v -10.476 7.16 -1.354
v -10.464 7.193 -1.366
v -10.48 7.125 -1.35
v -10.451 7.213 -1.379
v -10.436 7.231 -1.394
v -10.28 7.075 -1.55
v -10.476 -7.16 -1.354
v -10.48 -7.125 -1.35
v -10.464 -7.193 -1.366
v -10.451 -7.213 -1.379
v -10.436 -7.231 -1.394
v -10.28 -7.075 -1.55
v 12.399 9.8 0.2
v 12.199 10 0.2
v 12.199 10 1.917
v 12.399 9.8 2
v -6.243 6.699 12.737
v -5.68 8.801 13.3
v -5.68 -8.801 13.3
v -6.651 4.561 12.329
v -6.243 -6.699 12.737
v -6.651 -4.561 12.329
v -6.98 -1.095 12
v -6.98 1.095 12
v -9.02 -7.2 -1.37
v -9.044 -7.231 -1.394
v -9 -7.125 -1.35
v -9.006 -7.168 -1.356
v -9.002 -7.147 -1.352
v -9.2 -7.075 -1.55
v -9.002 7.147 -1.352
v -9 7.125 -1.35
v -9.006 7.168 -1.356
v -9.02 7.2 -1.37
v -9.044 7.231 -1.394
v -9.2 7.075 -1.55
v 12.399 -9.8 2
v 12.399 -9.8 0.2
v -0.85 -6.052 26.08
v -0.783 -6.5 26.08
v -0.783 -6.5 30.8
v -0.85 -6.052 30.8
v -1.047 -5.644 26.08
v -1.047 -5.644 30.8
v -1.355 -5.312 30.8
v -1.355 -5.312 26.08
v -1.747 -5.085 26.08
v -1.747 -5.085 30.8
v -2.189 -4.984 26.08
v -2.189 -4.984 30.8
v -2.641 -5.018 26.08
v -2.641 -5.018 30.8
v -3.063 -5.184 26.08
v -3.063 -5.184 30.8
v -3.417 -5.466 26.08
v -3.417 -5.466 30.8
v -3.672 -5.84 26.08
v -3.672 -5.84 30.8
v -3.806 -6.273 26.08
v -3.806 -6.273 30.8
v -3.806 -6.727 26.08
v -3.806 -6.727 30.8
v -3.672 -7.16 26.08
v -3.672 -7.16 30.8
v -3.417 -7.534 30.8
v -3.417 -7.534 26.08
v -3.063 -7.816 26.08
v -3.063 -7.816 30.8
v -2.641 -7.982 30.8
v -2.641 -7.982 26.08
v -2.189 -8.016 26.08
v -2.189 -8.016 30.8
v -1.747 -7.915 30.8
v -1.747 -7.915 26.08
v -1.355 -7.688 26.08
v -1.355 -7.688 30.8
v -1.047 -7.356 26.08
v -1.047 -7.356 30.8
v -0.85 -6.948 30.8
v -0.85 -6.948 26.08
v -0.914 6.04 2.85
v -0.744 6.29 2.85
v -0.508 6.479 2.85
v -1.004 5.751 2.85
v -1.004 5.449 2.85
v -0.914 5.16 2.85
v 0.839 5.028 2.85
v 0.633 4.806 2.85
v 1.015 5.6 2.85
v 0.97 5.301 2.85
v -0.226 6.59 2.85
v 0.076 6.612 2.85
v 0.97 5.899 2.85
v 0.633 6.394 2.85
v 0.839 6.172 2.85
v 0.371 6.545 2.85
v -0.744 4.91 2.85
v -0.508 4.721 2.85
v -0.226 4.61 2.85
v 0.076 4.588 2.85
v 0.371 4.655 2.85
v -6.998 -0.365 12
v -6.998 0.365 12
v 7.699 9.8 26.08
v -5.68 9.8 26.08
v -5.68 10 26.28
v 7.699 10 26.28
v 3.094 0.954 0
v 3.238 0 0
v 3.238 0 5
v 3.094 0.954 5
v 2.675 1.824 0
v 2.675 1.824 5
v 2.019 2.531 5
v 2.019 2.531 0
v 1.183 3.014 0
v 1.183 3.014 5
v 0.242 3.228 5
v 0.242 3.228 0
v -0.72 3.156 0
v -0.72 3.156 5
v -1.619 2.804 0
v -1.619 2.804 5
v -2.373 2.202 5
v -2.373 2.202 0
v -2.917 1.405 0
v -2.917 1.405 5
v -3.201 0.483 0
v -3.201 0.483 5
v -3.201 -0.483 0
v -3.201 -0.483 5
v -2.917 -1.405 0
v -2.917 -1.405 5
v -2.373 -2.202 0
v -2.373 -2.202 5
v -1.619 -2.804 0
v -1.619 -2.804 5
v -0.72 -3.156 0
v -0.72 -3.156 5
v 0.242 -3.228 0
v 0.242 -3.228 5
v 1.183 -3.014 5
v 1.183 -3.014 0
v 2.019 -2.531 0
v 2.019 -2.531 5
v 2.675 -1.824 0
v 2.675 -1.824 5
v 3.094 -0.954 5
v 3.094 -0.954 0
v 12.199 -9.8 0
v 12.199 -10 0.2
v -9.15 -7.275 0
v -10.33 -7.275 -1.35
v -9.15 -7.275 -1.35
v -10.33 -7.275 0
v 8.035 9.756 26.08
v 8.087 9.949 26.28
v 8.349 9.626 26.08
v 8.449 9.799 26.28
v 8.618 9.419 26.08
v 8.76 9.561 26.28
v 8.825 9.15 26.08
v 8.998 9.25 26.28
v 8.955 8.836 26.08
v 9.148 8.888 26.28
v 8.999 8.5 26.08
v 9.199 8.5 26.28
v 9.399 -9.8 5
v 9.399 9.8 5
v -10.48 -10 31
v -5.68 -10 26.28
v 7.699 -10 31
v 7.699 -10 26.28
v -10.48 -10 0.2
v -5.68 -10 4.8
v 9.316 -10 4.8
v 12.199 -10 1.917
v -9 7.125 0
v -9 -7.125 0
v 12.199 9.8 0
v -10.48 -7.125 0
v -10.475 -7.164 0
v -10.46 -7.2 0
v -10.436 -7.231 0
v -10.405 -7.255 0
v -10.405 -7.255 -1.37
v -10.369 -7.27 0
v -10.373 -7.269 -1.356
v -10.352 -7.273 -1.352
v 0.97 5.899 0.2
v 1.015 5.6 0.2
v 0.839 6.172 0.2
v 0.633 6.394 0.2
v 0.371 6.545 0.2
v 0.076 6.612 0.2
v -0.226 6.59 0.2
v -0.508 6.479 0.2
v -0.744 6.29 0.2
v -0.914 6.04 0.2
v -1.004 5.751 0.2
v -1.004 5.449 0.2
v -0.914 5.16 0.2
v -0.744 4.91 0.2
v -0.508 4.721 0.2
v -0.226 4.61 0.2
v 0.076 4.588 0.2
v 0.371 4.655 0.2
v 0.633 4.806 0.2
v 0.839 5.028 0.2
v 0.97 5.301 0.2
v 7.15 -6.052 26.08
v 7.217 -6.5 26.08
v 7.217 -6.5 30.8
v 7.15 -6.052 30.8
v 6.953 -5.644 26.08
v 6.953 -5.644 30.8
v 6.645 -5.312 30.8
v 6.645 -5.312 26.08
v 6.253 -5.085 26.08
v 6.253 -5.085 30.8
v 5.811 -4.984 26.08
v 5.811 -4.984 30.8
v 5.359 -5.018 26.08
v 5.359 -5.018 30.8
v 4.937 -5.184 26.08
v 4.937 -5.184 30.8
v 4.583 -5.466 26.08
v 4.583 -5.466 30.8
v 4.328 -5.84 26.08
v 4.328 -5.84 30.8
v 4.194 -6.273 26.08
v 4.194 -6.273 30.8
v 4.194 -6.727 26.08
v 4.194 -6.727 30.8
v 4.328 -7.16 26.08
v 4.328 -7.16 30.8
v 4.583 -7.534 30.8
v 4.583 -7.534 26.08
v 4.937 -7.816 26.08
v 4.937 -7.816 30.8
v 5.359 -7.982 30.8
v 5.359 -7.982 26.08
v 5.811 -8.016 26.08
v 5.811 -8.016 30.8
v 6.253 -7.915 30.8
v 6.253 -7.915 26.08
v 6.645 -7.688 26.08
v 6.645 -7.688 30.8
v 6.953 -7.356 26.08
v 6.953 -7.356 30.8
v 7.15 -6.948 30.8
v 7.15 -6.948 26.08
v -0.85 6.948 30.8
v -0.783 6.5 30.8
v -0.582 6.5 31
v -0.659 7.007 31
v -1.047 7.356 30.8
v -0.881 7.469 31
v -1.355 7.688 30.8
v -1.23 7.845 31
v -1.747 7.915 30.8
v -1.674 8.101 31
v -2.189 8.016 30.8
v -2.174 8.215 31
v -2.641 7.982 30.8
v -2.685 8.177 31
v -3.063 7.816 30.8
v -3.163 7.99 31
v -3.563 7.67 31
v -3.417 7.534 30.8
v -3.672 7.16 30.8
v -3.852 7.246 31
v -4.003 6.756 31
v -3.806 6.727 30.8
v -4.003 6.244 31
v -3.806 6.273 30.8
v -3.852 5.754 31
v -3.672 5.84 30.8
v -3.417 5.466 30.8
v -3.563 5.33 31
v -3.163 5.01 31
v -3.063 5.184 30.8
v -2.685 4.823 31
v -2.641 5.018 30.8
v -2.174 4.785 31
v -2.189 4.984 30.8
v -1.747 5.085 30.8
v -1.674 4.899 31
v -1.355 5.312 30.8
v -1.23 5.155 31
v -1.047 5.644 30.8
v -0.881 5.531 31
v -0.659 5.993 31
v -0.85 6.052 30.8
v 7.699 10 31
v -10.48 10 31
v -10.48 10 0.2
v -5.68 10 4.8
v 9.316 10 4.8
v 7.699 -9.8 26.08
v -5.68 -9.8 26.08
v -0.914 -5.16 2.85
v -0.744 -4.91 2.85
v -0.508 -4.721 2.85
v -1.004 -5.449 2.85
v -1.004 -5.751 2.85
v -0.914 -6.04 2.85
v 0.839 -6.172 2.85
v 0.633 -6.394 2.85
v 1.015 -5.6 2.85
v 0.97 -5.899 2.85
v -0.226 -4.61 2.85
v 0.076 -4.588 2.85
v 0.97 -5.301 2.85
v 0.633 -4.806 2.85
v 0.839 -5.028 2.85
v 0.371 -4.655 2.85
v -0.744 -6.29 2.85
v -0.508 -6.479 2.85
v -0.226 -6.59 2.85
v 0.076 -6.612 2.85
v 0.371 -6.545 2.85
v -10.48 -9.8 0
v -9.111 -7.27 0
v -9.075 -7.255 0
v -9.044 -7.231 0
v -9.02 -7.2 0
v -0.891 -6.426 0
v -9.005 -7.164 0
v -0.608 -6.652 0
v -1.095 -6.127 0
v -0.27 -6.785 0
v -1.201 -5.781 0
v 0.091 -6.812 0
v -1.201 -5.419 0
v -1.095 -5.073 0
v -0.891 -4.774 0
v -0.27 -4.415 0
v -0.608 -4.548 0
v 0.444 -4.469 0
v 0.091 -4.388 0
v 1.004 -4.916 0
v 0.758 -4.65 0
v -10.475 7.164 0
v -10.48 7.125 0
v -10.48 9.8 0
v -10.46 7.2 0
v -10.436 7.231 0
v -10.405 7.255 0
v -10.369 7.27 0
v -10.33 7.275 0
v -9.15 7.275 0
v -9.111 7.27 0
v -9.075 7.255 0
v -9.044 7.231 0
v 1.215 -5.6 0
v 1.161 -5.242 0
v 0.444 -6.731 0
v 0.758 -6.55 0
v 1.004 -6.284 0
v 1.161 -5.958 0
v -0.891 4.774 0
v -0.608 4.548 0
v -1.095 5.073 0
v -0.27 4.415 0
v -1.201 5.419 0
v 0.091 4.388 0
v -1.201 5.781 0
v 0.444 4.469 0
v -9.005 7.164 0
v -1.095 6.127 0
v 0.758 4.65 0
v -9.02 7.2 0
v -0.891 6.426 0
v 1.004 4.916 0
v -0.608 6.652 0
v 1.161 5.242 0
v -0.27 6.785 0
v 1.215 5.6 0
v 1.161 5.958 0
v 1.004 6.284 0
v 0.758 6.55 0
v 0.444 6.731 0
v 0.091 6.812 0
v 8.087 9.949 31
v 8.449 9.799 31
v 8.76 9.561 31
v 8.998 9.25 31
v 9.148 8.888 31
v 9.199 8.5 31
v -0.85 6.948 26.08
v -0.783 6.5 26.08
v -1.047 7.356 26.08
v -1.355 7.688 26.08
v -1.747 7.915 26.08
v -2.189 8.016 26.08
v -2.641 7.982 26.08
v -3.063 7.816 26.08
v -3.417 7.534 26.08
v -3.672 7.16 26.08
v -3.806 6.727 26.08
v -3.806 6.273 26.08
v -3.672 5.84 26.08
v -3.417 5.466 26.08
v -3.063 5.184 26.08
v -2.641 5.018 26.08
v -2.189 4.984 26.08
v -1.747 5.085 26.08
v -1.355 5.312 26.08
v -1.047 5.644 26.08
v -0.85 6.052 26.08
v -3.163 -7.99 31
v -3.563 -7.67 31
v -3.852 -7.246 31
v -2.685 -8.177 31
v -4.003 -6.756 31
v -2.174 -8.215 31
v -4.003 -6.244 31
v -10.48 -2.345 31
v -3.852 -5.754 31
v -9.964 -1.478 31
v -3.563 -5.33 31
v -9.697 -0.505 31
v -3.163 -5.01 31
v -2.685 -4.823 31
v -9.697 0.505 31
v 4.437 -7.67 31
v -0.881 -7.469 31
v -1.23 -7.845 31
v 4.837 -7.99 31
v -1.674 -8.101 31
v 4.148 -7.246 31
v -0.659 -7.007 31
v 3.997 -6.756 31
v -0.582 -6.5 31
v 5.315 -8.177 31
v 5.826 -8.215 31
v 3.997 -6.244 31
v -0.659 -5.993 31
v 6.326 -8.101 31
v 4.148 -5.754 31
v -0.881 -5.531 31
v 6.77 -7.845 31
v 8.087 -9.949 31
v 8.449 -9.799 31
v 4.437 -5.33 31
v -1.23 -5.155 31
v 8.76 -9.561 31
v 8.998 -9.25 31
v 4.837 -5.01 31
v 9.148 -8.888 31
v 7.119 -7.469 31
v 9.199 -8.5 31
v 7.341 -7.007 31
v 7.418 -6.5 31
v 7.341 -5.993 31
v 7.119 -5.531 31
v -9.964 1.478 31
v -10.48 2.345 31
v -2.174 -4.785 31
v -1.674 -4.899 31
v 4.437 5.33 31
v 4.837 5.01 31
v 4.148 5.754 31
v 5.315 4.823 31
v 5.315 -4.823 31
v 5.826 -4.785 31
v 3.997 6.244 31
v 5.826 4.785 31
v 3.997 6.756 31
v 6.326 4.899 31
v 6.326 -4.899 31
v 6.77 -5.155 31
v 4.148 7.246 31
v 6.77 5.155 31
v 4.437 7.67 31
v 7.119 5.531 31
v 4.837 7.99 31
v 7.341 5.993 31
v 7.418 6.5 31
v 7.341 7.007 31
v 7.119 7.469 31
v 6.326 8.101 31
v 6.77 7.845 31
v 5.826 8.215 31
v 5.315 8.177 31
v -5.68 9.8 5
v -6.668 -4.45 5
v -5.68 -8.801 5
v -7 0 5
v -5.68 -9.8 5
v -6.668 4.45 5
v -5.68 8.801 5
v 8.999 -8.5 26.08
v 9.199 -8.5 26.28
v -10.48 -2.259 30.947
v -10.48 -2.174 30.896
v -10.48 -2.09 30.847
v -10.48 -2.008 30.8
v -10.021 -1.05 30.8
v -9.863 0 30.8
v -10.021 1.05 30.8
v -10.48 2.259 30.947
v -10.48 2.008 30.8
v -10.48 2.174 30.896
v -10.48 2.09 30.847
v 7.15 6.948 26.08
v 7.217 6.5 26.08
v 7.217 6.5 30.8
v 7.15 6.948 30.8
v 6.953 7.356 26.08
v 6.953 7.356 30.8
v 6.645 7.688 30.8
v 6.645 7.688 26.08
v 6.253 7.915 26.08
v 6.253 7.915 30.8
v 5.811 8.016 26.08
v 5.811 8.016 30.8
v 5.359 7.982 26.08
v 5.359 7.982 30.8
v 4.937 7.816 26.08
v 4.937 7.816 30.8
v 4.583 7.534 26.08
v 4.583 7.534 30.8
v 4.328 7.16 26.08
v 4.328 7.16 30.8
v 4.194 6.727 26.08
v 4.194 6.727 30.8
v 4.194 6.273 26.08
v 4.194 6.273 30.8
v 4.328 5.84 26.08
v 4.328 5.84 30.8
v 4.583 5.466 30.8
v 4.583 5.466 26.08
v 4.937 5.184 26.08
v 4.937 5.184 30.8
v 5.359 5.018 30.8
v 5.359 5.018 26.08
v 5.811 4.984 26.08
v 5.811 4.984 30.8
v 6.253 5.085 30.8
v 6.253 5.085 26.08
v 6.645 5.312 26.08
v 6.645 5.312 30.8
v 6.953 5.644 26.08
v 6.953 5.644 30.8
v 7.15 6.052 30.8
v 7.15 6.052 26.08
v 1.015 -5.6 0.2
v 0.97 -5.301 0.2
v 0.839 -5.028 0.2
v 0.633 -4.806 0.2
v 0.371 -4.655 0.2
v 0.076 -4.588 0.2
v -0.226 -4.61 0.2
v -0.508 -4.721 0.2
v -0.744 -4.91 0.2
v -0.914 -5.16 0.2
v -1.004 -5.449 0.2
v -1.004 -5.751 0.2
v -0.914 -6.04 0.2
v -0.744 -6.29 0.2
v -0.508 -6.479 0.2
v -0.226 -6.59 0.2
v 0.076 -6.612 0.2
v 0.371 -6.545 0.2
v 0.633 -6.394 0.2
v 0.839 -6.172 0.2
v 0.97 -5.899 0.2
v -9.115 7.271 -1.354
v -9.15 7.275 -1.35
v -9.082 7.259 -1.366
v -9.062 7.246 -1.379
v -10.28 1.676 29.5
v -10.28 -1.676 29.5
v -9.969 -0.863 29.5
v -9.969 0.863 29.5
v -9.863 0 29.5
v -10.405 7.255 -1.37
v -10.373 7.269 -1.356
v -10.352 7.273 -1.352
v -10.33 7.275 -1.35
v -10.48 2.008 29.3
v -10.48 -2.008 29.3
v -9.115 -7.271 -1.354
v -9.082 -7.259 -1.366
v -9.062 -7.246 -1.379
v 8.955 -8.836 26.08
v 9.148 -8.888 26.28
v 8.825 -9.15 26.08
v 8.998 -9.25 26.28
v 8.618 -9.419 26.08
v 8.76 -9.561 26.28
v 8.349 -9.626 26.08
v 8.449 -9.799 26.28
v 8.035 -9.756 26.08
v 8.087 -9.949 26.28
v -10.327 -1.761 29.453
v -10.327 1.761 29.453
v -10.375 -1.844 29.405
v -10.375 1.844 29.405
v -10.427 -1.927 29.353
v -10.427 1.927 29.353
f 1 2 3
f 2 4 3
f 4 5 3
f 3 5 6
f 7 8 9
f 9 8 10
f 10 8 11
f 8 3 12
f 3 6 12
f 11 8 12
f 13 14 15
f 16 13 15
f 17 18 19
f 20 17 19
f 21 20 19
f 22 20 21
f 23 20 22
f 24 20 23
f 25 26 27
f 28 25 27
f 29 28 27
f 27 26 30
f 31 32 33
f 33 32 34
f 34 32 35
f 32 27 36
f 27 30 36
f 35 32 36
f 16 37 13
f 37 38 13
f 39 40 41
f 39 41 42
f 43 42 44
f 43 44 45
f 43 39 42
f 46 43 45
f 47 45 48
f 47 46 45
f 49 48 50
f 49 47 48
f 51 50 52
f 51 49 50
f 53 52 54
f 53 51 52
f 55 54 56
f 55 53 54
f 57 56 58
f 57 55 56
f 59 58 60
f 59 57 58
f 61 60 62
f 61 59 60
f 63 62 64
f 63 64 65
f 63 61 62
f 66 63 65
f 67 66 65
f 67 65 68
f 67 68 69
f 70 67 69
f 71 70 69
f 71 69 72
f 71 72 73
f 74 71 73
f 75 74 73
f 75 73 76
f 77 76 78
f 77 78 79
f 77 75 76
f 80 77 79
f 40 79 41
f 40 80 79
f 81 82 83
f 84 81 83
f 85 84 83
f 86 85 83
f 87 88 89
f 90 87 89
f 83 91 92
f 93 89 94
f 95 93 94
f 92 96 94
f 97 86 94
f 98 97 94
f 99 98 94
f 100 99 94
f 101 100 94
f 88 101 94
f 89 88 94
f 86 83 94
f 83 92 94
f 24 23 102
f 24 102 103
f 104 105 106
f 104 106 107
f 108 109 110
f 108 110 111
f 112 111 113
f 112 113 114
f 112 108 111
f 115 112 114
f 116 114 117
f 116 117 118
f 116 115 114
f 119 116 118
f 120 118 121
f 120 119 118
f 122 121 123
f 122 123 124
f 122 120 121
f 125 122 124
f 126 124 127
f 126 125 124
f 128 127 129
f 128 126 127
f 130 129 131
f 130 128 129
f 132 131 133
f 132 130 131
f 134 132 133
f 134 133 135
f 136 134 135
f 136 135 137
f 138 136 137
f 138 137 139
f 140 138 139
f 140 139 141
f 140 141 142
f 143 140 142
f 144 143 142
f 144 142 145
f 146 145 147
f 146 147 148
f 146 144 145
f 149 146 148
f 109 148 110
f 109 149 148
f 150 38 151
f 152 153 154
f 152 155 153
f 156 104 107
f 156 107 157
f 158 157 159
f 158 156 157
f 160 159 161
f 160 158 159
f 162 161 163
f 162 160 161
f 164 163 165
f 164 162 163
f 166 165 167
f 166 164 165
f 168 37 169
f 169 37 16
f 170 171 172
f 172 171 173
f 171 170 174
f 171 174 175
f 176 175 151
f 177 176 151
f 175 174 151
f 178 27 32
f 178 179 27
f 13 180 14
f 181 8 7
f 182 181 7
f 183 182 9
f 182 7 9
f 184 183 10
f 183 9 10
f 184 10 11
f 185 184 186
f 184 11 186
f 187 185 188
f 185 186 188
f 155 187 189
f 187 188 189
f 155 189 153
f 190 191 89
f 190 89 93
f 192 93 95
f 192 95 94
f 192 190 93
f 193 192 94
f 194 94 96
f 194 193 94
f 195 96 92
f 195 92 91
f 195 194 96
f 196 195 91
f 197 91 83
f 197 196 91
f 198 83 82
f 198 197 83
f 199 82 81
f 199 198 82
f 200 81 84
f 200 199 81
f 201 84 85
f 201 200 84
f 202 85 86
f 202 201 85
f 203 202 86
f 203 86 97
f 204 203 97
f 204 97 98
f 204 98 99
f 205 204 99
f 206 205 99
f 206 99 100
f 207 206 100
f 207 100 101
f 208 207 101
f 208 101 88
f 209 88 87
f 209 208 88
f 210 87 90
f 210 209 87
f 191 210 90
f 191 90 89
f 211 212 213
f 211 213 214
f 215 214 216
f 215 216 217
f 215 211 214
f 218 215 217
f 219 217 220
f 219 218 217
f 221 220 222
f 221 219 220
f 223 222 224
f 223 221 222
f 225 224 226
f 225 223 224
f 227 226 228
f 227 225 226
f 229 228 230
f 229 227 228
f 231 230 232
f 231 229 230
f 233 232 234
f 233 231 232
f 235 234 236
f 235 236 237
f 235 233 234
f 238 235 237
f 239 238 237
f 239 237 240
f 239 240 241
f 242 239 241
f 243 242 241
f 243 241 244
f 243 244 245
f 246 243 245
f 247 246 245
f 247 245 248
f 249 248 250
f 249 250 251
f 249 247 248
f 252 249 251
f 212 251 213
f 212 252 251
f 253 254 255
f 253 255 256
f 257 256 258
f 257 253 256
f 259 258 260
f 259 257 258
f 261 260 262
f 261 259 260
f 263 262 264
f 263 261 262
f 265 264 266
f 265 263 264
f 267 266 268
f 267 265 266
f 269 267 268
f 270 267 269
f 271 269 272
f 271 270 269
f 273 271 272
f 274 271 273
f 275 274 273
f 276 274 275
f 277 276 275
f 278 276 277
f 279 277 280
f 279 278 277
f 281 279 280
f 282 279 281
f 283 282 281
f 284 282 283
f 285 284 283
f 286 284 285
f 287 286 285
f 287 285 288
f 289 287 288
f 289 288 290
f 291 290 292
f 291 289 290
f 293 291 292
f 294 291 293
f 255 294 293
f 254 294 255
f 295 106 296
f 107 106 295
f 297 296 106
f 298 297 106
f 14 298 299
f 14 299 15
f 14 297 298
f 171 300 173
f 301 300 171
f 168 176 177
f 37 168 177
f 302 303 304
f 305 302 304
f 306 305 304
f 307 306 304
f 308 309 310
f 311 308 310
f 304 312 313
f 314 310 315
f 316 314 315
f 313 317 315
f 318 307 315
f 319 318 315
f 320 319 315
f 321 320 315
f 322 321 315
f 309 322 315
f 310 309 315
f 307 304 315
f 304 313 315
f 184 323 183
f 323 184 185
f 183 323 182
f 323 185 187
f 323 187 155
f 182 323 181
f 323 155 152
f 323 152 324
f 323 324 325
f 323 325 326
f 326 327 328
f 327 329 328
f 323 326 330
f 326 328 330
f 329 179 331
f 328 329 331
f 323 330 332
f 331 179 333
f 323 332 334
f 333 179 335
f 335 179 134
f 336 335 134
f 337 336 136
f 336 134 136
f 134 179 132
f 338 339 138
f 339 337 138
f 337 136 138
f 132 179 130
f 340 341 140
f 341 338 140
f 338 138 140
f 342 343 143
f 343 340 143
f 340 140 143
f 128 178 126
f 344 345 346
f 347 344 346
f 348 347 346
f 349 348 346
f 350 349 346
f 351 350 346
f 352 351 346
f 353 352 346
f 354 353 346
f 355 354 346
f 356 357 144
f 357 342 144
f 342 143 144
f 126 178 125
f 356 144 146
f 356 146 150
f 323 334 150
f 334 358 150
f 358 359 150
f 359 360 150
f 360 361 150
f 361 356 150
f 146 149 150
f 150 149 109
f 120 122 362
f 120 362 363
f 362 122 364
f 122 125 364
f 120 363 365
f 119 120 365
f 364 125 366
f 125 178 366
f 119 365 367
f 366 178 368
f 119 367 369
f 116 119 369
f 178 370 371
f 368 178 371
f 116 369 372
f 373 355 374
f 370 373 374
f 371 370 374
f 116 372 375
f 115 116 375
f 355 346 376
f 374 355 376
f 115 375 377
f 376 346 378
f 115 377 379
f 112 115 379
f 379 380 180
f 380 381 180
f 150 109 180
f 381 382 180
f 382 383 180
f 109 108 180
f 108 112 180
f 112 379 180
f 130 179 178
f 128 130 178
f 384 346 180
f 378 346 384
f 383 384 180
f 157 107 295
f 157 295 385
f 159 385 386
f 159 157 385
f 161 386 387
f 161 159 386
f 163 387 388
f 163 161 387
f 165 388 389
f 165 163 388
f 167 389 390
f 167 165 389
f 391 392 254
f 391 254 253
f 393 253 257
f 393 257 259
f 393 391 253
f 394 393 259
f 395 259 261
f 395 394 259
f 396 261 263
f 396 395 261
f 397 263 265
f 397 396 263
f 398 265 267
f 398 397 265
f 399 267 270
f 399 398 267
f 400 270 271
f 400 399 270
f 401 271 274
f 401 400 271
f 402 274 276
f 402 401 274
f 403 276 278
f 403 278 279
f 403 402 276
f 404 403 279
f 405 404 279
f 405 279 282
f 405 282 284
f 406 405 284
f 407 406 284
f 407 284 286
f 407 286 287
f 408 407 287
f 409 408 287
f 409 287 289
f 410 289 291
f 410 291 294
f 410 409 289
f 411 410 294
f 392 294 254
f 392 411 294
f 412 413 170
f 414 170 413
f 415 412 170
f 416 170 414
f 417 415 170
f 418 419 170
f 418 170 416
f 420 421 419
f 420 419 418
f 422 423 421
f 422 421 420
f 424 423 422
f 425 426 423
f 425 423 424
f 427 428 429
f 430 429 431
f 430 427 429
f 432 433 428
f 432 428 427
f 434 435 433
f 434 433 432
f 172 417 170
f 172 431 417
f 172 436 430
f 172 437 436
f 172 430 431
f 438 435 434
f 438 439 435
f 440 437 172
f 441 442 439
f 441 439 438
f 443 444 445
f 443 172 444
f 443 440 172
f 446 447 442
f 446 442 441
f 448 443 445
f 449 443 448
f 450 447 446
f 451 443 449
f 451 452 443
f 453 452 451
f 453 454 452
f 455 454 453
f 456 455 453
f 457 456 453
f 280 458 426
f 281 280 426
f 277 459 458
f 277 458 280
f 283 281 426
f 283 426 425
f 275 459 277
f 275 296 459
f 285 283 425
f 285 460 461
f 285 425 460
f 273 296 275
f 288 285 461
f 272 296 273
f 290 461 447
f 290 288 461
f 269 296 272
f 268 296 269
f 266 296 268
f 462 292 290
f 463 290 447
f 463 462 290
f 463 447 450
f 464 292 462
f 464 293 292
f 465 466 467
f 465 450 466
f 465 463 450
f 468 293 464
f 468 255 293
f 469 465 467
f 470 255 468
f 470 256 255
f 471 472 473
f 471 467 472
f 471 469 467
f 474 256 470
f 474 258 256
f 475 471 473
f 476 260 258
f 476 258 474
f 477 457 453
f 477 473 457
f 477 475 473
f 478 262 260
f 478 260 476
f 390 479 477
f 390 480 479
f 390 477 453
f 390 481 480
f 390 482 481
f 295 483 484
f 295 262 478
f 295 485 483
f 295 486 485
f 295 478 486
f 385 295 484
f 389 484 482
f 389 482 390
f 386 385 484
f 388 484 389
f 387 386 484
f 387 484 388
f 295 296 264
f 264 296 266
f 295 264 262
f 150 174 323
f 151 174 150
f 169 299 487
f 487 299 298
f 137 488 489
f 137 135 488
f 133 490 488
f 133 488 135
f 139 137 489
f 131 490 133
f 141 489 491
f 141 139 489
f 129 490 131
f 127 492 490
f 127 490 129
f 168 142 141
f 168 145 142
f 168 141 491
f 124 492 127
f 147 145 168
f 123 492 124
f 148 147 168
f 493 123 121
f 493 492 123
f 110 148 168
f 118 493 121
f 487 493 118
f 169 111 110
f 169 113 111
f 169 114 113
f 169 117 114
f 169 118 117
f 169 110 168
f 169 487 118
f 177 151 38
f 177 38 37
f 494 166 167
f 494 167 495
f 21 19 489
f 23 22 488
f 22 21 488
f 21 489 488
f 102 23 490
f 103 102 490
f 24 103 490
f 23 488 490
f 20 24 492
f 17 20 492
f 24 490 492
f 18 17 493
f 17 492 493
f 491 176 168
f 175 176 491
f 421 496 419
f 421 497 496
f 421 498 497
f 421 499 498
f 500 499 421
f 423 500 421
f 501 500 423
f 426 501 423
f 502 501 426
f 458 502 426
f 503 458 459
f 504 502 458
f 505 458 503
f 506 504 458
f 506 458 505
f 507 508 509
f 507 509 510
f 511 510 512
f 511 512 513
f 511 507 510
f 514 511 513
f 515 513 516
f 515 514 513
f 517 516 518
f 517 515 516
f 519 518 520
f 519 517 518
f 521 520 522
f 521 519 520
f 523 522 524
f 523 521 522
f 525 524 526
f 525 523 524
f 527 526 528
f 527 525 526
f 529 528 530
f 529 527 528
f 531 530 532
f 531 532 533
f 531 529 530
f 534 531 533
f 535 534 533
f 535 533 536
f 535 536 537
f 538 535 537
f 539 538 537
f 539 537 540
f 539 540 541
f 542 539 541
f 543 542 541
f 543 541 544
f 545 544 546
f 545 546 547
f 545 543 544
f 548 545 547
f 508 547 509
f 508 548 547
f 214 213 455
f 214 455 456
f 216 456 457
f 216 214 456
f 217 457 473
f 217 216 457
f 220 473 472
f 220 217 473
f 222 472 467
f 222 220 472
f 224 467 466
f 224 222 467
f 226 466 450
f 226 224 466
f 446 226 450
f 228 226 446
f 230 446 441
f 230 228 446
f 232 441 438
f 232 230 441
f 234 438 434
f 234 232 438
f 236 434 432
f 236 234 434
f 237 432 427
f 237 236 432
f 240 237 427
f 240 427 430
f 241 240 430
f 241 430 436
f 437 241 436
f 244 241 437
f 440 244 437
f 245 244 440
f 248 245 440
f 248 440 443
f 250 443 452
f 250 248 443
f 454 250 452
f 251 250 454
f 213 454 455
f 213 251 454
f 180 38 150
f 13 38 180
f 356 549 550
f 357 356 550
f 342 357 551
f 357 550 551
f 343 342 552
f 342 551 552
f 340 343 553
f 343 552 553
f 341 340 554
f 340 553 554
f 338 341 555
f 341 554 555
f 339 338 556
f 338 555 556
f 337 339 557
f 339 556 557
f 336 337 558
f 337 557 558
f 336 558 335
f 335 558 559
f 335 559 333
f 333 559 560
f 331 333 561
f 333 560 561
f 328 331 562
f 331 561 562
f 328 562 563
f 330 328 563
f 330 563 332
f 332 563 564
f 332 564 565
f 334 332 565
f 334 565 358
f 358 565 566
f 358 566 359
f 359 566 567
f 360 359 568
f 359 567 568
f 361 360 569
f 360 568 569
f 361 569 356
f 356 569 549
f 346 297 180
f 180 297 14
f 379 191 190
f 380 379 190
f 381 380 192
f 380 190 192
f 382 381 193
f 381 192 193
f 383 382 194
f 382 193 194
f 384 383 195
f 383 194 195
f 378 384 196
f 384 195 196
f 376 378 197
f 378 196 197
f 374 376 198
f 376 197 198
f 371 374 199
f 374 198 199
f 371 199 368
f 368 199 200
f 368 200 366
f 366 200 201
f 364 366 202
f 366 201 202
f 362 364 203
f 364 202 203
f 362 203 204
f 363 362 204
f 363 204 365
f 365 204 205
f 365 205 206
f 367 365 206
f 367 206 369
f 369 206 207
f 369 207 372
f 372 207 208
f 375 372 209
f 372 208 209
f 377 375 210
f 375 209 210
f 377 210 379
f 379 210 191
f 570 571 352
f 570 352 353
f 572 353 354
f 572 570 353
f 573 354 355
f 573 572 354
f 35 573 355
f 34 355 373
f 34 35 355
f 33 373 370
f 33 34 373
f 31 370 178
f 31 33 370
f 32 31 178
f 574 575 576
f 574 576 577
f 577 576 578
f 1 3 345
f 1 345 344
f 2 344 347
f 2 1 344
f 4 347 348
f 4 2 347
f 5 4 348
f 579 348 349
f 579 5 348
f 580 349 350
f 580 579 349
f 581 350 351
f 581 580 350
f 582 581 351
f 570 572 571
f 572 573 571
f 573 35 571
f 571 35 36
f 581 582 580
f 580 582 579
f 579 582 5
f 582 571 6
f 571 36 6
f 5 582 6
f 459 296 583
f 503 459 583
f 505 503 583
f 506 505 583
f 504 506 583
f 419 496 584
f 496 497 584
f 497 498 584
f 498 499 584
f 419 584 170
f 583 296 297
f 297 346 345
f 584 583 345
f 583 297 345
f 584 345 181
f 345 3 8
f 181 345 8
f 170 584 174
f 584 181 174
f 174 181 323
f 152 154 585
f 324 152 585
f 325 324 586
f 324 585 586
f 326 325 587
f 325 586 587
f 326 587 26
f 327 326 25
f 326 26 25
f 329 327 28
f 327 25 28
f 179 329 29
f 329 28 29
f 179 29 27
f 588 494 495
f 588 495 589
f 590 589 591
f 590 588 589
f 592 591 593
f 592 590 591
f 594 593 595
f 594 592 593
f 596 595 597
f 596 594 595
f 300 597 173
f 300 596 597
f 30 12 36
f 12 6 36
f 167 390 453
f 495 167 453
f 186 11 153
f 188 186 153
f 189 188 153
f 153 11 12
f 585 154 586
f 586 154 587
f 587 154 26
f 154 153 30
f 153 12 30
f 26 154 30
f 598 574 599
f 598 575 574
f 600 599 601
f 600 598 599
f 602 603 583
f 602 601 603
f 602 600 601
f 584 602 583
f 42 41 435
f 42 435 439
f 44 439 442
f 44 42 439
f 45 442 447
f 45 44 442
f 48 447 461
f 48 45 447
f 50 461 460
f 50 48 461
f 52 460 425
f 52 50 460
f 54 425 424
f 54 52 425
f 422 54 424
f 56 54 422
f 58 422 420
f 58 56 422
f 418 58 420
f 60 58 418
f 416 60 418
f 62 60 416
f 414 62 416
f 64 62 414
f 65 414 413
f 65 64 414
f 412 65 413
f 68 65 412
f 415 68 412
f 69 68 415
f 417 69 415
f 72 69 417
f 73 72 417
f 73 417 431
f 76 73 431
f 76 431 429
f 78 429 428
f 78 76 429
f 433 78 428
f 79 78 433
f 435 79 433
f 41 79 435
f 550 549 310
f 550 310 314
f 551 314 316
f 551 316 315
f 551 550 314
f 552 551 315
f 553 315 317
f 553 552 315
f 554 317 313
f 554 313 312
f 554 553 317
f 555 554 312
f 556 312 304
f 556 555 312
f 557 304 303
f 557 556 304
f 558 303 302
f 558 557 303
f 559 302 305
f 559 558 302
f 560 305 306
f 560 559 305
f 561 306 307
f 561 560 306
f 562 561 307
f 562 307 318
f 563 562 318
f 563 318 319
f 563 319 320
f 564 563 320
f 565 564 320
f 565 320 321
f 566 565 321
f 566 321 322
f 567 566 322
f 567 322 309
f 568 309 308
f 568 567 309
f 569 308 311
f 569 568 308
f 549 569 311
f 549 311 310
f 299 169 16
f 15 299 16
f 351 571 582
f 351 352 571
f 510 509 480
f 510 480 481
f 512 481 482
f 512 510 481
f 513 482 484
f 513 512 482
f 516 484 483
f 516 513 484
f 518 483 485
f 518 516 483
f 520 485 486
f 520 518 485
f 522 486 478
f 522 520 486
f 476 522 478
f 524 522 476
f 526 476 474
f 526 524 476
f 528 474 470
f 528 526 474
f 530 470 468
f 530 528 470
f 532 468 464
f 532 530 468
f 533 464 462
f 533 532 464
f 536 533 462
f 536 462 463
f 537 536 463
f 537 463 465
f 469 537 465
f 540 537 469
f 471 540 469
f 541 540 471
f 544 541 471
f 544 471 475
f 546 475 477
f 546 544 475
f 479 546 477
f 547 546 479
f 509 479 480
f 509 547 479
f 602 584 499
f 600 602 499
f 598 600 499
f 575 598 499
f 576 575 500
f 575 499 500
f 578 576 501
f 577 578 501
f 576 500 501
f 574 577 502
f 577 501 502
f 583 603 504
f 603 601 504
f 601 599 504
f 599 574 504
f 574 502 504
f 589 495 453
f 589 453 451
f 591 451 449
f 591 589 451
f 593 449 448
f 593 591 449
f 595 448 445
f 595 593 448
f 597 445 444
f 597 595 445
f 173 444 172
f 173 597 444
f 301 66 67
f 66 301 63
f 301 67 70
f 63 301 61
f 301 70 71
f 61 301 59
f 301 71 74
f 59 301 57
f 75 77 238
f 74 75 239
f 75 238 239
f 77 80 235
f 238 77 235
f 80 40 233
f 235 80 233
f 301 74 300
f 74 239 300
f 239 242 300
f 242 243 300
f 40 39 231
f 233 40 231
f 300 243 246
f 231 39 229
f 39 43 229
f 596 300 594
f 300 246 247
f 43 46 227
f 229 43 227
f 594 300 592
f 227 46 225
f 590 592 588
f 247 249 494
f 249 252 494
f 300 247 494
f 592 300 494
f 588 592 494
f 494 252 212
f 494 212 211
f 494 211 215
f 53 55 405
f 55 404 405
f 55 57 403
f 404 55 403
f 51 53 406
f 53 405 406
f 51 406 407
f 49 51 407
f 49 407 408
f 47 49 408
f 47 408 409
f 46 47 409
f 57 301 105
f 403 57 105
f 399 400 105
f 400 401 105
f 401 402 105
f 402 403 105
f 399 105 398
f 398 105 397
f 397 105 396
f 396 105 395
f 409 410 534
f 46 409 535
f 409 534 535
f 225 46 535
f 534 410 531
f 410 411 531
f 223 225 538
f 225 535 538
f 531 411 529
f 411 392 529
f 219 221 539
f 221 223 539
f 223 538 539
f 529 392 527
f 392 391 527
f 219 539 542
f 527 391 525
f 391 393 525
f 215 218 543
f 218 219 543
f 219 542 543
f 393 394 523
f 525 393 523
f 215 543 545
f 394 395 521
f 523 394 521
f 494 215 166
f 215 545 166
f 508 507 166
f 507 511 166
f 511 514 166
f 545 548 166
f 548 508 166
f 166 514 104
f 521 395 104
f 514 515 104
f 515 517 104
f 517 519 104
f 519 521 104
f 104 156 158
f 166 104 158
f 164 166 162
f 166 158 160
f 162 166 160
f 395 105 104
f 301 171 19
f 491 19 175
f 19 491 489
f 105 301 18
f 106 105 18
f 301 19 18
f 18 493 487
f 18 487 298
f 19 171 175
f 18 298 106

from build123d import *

# Parameters (mm, degrees)
SKETCH_1_R          = 3.2375
EXTRUDE_1_DEPTH     = 5
SKETCH_2_R          = 1.015
CUT_EXTRUDE_1_DEPTH = 2.85
CHAMFER_1_SIZE      = 0.2
EXTRUDE_2_DEPTH     = 1.55
CHAMFER_2_SIZE      = 0.2
FILLET_1_R          = 0.15
SKETCH_6_W          = 4.8
SKETCH_6_H          = 20
EXTRUDE_3_DEPTH     = 31
EXTRUDE_START       = 31
SKETCH_7_W          = 19.9
SKETCH_7_H          = 20
EXTRUDE_4_DEPTH     = 4.92
CUT_EXTRUDE_START   = 26.08
SKETCH_8_R          = 1.52
CUT_EXTRUDE_2_DEPTH = 4.92
CHAMFER_3_SIZE      = 0.2
CUT_EXTRUDE_START_2 = 31
CUT_EXTRUDE_3_DEPTH = 31
FILLET_2_R          = 1.5
CUT_EXTRUDE_4_DEPTH = 1.5
CHAMFER_4_SIZE      = 0.2
SKETCH_13_W         = 3.2
SKETCH_13_H         = 20
EXTRUDE_5_DEPTH     = 5
CHAMFER_5_SIZE      = 3
CUT_EXTRUDE_START_3 = 5
CUT_EXTRUDE_5_DEPTH = 7
CHAMFER_7_SIZE      = 1.3
CHAMFER_8_SIZE      = 0.2


with BuildPart() as part:
    # 草图1 → 凸台-拉伸1 (new body)
    with BuildSketch(Plane.XY):
        Polygon((13.5775, 0), (13.5775, 10), (-10.48, 10), (-10.48, 0), (-10.48, -10), (13.5775, -10), align=None)
        Circle(SKETCH_1_R, mode=Mode.SUBTRACT)
    extrude(amount=EXTRUDE_1_DEPTH)

    # 草图2 → 切除-拉伸1 (cut)
    with BuildSketch(Plane.XY):
        with Locations((0, 5.6)):
            Circle(SKETCH_2_R)
        with Locations((0, -5.6)):
            Circle(SKETCH_2_R)
    extrude(amount=CUT_EXTRUDE_1_DEPTH, mode=Mode.SUBTRACT)

    # 倒角1
    chamfer_1_edges = [part.edges().sort_by_distance(p)[0] for p in [
        (-1.015, 5.6, 0),
        (-1.015, -5.6, 0),
    ]]
    chamfer(chamfer_1_edges, length=CHAMFER_1_SIZE)

    # 草图5 → 凸台-拉伸2 (add)
    with BuildSketch(Plane.XY):
        Polygon((-9, 7.275), (-10.48, 7.275), (-10.48, -7.275), (-9, -7.275), (-9, 0), align=None)
    extrude(amount=-EXTRUDE_2_DEPTH)

    # 倒角2
    chamfer_2_edges = [part.edges().sort_by_distance(p)[0] for p in [
        (-9.74, -7.275, -1.55),
        (-10.48, 0, -1.55),
        (-9.74, 7.275, -1.55),
        (-9, 0, -1.55),
    ]]
    chamfer(chamfer_2_edges, length=CHAMFER_2_SIZE)

    # 圆角1
    fillet_1_edges = [part.edges().sort_by_distance(p)[0] for p in [
        (-10.48, -7.275, -0.675),
        (-9, -7.275, -0.675),
        (-9, 7.275, -0.675),
        (-10.48, 7.275, -0.675),
    ]]
    fillet(fillet_1_edges, radius=FILLET_1_R)

    # 草图6 → 凸台-拉伸3 (add)
    with BuildSketch(Plane.XY):
        with Locations((-8.08, 0)):
            Rectangle(SKETCH_6_W, SKETCH_6_H)
    extrude(amount=EXTRUDE_3_DEPTH)

    # 草图7 → 凸台-拉伸4 (add)
    with BuildSketch(Plane.XY.offset(EXTRUDE_START)):
        with Locations((3.6275, 0)):
            Rectangle(SKETCH_7_W, SKETCH_7_H)
    extrude(amount=-EXTRUDE_4_DEPTH)

    # 草图8 → 切除-拉伸2 (cut)
    with BuildSketch(Plane.XY.offset(CUT_EXTRUDE_START)):
        with Locations((-2.3025, 6.5)):
            Circle(SKETCH_8_R)
        with Locations((5.6975, 6.5)):
            Circle(SKETCH_8_R)
        with Locations((5.6975, -6.5)):
            Circle(SKETCH_8_R)
        with Locations((-2.3025, -6.5)):
            Circle(SKETCH_8_R)
    extrude(amount=CUT_EXTRUDE_2_DEPTH, mode=Mode.SUBTRACT)

    # 倒角3
    chamfer_3_edges = [part.edges().sort_by_distance(p)[0] for p in [
        (-3.8225, -6.5, 31),
        (4.1775, -6.5, 31),
        (4.1775, 6.5, 31),
        (-3.8225, 6.5, 31),
    ]]
    chamfer(chamfer_3_edges, length=CHAMFER_3_SIZE)

    # 草图10 → 切除-拉伸3 (cut)
    with BuildSketch(Plane.XY.offset(CUT_EXTRUDE_START_2)):
        Polygon((9.198987738, 6.5), (9.198987738, -10), (13.5775, -10), (13.5775, 10), (9.198987738, 10), align=None)
    extrude(amount=-CUT_EXTRUDE_3_DEPTH, mode=Mode.SUBTRACT)

    # 圆角2
    fillet_2_edges = [part.edges().sort_by_distance(p)[0] for p in [
        (9.198987738, 10, 28.54),
        (9.198987738, -10, 28.54),
    ]]
    fillet(fillet_2_edges, radius=FILLET_2_R)

    # 草图11 → 切除-拉伸4 (cut)
    with BuildSketch(Plane.XY.offset(CUT_EXTRUDE_START_2)):
        with BuildLine():
            Line((-10.48, 2.007504789), (-10.48, -2.007504789))
            ThreePointArc((-10.48, -2.007504789), (-9.862877127, 0), (-10.48, 2.007504789))
        make_face()
    extrude(amount=-CUT_EXTRUDE_4_DEPTH, mode=Mode.SUBTRACT)

    # 倒角4
    chamfer_4_edges = [part.edges().sort_by_distance(p)[0] for p in [
        (1.009493869, 10, 26.08),
        (1.009493869, -10, 26.08),
        (9.198987738, 0, 26.08),
        (8.759647909, 9.560660172, 26.08),
        (8.759647909, -9.560660172, 26.08),
        (-10.48, 0, 29.5),
        (-9.862877127, 0, 31),
    ]]
    chamfer(chamfer_4_edges, length=CHAMFER_4_SIZE)

    # 草图13 → 凸台-拉伸5 (add)
    with BuildSketch(Plane.XY):
        with Locations((10.798987738, 0)):
            Rectangle(SKETCH_13_W, SKETCH_13_H)
    extrude(amount=EXTRUDE_5_DEPTH)

    # 倒角5
    chamfer_5_edges = [part.edges().sort_by_distance(p)[0] for p in [
        (12.398987738, 0, 5),
    ]]
    chamfer(chamfer_5_edges, length=CHAMFER_5_SIZE)

    # 草图14 → 切除-拉伸5 (cut)
    with BuildSketch(Plane.XY.offset(CUT_EXTRUDE_START_3)):
        with BuildLine():
            Line((-5.284271247, 10), (-5.284271247, -10))
            ThreePointArc((-5.284271247, -10), (-7, 0), (-5.284271247, 10))
        make_face()
    extrude(amount=CUT_EXTRUDE_5_DEPTH, mode=Mode.SUBTRACT)

    # 倒角7
    chamfer_7_edges = [part.edges().sort_by_distance(p)[0] for p in [
        (-5.68, 0, 12),
    ]]
    chamfer(chamfer_7_edges, length=CHAMFER_7_SIZE)

    # 倒角8
    chamfer_8_edges = [part.edges().sort_by_distance(p)[0] for p in [
        (1.859493869, -10, 5),
        (0.959493869, 10, 0),
        (12.398987738, 0, 0),
        (12.398987738, 10, 1),
        (12.398987738, -10, 1),
        (10.898987738, -10, 3.5),
        (1.859493869, 10, 5),
        (10.898987738, 10, 3.5),
        (0.959493869, -10, 0),
    ]]
    chamfer(chamfer_8_edges, length=CHAMFER_8_SIZE)


solid = part.part
